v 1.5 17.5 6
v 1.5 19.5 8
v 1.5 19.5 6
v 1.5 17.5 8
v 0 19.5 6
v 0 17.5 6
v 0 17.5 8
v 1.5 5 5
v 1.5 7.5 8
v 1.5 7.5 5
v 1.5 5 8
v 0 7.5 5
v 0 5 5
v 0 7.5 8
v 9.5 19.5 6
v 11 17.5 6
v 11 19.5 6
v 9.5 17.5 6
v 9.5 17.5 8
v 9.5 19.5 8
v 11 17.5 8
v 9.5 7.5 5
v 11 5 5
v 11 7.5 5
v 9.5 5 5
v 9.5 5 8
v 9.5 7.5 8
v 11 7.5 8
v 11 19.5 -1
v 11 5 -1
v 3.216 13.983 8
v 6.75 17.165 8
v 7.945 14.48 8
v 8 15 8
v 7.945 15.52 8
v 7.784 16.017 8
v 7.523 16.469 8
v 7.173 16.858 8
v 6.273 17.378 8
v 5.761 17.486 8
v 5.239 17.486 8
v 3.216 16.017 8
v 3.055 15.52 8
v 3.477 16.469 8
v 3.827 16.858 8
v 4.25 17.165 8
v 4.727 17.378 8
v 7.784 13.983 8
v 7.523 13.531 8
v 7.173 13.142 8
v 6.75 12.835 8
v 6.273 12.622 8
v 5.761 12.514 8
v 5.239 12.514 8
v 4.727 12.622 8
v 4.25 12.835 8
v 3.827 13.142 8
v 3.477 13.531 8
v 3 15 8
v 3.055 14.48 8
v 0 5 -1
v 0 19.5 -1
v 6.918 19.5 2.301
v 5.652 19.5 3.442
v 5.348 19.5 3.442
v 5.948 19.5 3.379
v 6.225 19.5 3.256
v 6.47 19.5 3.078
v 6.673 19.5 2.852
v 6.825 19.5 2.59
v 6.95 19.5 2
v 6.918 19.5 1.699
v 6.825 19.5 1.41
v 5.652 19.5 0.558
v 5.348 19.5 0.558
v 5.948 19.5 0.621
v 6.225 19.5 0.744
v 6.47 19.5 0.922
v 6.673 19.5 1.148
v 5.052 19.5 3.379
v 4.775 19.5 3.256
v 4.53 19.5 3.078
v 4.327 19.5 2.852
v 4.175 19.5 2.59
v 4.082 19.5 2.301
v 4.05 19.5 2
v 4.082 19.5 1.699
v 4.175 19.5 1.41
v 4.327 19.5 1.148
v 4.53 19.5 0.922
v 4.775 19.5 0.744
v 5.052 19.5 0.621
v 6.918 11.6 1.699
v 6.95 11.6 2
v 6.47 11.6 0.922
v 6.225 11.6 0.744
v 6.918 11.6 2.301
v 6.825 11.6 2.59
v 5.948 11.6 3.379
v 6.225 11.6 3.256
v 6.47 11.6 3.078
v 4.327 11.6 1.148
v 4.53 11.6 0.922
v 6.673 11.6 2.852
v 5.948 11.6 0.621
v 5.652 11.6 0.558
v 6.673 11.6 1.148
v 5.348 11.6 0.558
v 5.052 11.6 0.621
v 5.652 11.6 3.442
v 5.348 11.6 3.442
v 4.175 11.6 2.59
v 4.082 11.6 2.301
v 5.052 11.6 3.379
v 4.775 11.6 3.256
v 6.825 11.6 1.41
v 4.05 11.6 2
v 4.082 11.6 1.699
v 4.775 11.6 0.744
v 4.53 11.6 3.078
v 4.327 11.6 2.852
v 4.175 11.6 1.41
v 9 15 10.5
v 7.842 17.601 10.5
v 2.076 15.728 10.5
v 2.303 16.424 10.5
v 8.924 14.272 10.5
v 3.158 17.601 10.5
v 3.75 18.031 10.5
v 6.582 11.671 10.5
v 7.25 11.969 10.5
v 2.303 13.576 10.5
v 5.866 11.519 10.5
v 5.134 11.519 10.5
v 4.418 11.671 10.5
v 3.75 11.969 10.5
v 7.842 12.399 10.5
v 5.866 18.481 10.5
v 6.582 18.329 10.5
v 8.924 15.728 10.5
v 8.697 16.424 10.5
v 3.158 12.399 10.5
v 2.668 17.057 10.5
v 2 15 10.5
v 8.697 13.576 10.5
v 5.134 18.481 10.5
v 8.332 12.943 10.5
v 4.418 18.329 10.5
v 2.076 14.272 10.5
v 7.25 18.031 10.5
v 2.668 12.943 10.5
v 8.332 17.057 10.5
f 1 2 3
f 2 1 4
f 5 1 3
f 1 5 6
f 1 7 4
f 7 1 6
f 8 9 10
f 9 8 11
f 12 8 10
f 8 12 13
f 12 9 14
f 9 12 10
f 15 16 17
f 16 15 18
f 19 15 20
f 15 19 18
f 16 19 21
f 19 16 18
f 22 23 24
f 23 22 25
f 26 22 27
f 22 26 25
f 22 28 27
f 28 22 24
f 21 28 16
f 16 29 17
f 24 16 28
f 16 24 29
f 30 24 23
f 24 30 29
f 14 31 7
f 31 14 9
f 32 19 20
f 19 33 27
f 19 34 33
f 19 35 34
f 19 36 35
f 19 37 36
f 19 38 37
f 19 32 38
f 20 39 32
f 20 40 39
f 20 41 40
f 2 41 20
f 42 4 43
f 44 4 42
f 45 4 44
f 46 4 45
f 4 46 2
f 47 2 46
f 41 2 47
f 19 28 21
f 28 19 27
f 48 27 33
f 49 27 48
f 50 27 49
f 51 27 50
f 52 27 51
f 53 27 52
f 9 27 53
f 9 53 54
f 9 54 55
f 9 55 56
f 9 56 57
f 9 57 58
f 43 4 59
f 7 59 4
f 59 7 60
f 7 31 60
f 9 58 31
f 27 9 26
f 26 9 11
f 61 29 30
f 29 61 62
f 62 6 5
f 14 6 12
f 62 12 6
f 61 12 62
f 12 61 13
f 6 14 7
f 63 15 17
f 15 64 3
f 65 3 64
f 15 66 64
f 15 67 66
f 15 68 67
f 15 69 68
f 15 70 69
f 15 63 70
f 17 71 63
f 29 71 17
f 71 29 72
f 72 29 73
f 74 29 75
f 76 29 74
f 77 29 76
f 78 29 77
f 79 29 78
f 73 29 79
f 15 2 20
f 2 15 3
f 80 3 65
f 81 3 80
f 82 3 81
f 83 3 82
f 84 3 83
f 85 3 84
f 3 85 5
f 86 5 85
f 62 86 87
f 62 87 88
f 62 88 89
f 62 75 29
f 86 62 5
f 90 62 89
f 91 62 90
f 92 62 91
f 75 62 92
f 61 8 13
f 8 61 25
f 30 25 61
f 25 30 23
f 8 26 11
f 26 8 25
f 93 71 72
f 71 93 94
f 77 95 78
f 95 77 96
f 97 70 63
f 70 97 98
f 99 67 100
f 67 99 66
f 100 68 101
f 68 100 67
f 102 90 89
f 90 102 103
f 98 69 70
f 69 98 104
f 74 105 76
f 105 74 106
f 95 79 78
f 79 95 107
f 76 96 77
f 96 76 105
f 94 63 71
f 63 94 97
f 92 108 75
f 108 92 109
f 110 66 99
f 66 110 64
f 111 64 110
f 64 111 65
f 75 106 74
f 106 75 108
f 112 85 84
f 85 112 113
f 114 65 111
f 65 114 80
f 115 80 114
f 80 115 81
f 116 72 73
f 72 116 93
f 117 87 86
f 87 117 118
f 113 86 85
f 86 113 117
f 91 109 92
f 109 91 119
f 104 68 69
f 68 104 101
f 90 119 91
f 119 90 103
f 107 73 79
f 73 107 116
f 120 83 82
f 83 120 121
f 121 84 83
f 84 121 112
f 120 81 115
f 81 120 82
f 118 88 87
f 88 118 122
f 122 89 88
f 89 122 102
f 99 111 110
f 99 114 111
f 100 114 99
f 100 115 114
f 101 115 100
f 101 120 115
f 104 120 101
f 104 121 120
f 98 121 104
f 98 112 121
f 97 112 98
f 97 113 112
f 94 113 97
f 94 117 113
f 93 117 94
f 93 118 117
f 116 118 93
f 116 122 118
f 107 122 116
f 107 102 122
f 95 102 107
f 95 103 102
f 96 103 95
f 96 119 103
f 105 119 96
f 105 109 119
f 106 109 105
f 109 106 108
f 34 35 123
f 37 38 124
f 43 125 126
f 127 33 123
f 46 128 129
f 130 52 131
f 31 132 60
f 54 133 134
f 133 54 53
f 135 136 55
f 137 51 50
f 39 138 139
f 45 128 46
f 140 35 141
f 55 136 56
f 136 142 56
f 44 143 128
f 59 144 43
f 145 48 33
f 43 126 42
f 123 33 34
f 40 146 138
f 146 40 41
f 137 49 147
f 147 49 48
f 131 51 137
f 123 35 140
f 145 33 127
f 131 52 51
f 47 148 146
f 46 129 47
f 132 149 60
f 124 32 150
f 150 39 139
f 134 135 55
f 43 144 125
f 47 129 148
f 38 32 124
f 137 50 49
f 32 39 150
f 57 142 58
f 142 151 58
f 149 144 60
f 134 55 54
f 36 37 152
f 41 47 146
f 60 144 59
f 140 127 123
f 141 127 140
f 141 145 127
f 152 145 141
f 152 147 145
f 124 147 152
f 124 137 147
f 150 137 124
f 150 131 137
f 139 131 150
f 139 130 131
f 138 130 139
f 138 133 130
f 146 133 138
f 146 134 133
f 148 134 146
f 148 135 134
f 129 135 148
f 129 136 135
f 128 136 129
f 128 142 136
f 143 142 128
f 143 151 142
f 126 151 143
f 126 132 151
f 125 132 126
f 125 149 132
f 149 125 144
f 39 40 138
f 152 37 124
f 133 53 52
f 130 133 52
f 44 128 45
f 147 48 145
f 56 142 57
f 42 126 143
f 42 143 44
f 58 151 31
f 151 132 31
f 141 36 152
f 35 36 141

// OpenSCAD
$fn=30;

difference() {
	translate([0,5,-1]) cube([11, 14.5, 9]);

	for (y = [-0.1, 9.5]) {
		translate([y, 18 - 1 + 0.5, 6]) cube([1.6, 2.6, 2.1]);
		translate([y, -0.1 + 0.5, 5]) cube([1.6, 7.1, 3.1]);
	}

	translate([11/2, 19.6, 2]) rotate([90, 0, 0]) cylinder(h=8, r=2.9/2);
}
translate([11/2, 15, 8]) cylinder(h=2.5, r1=5/2, r2=7/2);
